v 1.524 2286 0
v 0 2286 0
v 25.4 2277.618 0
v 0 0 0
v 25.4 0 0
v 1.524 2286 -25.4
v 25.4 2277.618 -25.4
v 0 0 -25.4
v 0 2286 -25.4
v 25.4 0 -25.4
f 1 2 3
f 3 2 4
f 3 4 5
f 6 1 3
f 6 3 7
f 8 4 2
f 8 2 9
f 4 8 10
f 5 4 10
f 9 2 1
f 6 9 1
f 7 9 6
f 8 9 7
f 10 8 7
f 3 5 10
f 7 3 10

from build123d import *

# Parameters (mm, degrees)
SKETCH1_W           = 25.4
SKETCH1_H           = 25.4
BOSS_EXTRUDE1_DEPTH = 2286
CHAMFER1_SIZE       = 8.382
CHAMFER1_SIZE2      = 23.876


with BuildPart() as part:
    # Sketch1 → Boss-Extrude1 (new body)
    with BuildSketch(Plane(origin=(0, 0, 0), x_dir=(1, 0, 0), z_dir=(0, 1, 0))):
        with Locations((12.7, 12.7)):
            Rectangle(SKETCH1_W, SKETCH1_H)
    extrude(amount=BOSS_EXTRUDE1_DEPTH)

    # Chamfer1
    chamfer1_edges = [part.edges().sort_by_distance(p)[0] for p in [
        (25.4, 2286, -12.7),
    ]]
    chamfer1_side = [part.faces().sort_by_distance(p)[0] for p in [
        (25.4, 1143, -12.7),
    ]]
    chamfer(chamfer1_edges, length=CHAMFER1_SIZE, length2=CHAMFER1_SIZE2, reference=chamfer1_side[0])


solid = part.part
